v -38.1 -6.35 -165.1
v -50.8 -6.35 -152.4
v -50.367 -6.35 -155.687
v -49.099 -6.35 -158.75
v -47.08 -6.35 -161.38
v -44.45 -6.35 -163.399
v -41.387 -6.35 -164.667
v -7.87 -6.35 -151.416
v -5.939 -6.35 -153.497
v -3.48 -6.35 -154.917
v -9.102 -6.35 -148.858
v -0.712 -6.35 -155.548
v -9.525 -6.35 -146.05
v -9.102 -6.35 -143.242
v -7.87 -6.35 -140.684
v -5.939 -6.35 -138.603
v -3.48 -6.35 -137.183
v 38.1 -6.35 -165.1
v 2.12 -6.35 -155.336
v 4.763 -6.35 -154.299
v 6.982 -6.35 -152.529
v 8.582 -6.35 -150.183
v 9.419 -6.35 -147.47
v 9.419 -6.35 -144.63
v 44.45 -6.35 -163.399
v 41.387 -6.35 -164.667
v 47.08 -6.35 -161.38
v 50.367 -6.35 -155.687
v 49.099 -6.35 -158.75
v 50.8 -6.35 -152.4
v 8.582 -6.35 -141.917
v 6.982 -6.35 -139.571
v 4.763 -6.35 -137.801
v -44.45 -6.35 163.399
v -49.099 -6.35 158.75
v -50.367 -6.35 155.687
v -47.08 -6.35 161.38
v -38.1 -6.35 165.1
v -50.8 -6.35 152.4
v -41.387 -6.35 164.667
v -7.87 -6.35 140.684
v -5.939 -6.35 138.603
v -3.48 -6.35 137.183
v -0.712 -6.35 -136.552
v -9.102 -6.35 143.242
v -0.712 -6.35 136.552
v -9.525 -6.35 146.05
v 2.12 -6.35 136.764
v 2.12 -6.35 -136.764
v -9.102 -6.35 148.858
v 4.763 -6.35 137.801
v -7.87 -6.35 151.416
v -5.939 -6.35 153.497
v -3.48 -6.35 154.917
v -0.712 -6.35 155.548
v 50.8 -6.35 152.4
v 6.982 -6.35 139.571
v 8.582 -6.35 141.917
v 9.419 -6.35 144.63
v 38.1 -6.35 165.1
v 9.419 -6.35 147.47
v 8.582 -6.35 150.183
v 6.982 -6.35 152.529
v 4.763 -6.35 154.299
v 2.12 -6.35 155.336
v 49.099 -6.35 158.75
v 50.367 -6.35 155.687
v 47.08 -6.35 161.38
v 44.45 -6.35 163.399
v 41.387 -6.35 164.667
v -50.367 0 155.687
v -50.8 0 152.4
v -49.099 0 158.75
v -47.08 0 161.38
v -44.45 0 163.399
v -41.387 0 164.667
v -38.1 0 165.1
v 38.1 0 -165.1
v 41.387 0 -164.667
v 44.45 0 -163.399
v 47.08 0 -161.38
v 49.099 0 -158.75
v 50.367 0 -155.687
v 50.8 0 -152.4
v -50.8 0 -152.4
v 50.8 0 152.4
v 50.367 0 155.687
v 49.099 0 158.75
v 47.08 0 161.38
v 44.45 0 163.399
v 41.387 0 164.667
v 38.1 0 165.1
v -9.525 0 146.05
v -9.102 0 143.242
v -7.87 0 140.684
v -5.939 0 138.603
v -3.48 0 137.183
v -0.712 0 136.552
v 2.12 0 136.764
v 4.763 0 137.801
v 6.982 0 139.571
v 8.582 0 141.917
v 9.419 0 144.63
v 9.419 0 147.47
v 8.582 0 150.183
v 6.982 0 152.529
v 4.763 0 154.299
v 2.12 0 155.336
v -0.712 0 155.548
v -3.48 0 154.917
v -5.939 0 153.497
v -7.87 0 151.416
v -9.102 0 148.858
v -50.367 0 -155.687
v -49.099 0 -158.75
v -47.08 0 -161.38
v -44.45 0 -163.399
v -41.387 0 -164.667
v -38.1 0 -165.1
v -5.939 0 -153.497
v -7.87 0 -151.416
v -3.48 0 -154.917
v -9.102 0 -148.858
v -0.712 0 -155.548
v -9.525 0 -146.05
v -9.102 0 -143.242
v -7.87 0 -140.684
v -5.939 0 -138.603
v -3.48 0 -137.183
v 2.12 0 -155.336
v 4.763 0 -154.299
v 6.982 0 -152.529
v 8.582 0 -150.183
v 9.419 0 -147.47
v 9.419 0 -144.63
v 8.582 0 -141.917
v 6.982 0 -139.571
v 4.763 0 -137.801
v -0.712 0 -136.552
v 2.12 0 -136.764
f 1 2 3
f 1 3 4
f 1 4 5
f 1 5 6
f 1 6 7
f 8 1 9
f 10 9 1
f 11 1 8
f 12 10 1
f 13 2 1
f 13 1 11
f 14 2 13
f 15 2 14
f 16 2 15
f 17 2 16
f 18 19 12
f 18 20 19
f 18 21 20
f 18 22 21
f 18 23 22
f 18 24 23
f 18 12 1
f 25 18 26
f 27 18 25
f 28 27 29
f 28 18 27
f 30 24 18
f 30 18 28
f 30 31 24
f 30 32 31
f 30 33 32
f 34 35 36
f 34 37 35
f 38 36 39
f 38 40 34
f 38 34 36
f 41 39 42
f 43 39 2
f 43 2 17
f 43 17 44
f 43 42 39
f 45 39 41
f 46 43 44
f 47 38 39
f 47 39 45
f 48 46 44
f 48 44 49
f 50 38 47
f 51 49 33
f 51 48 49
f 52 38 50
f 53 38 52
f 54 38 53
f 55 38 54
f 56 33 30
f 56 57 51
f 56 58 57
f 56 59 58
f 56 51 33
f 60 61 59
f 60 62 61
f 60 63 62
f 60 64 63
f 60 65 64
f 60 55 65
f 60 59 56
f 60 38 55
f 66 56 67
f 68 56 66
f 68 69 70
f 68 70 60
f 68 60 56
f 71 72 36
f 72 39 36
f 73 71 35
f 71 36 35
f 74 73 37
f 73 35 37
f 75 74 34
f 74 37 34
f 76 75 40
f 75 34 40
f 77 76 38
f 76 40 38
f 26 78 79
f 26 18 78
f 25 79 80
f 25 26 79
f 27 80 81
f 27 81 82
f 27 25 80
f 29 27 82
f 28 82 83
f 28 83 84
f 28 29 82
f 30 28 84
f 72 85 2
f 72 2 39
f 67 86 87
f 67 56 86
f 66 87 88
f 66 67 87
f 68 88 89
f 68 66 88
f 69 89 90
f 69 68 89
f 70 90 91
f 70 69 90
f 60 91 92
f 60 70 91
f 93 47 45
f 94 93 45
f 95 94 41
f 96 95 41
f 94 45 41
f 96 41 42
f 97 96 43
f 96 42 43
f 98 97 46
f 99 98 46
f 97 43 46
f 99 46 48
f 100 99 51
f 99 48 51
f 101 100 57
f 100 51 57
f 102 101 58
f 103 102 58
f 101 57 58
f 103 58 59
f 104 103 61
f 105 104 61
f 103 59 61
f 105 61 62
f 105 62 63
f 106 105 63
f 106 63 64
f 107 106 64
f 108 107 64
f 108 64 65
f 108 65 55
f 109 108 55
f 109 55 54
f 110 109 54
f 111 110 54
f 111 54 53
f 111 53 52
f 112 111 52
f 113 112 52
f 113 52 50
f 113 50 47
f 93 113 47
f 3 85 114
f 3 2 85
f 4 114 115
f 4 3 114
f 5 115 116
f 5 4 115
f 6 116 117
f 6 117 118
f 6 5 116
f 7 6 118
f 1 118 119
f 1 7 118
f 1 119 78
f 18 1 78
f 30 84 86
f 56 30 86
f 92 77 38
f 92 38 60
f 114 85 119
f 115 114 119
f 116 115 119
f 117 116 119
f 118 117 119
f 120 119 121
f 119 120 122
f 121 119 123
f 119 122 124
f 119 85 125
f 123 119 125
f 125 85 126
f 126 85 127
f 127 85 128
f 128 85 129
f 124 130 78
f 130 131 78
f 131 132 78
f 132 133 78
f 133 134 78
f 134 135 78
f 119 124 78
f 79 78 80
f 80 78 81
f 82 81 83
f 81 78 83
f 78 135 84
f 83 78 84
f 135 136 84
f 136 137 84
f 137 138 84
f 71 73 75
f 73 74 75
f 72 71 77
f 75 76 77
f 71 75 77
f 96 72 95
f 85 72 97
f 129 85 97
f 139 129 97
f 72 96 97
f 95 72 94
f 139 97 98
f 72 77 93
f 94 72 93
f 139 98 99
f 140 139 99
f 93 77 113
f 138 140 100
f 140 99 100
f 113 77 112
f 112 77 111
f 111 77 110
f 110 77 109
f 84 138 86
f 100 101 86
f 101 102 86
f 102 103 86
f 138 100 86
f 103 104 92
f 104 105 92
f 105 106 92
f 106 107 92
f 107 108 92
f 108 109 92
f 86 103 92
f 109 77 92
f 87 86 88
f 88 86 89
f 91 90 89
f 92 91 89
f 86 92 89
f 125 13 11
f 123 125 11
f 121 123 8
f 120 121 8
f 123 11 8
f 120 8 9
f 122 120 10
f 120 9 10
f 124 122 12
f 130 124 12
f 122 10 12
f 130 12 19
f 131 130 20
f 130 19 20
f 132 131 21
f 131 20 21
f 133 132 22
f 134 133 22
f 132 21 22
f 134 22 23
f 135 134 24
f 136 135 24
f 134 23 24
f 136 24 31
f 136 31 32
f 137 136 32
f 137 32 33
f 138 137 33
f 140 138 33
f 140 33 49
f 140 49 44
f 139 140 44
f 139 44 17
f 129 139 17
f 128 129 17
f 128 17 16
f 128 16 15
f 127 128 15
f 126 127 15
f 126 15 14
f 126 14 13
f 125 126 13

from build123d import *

# Parameters (mm, degrees)
F0_W     = 101.6
F0_H     = 330.2
F1_DEPTH = 6.35
F2_R     = 12.7
F4_D     = 19.05


with BuildPart() as f1:
    # F0 (on Front) → F1 (new body)
    with BuildSketch(Plane.XZ):
        Rectangle(F0_W, F0_H)
    extrude(amount=F1_DEPTH)

    # F2
    f2_edges = [f1.edges().sort_by_distance(p)[0] for p in [
        (50.8, -3.175, 165.1),
        (-50.8, -3.175, 165.1),
        (50.8, -3.175, -165.1),
        (-50.8, -3.175, -165.1),
    ]]
    fillet(f2_edges, radius=F2_R)

    # F4 (through all)
    with Locations(Plane(origin=(0, 0, 0), x_dir=(1, 0, 0), z_dir=(0, 1, 0))):
        with Locations((0, 146.05), (0, -146.05)):
            Hole(F4_D / 2)


solid = f1.part
